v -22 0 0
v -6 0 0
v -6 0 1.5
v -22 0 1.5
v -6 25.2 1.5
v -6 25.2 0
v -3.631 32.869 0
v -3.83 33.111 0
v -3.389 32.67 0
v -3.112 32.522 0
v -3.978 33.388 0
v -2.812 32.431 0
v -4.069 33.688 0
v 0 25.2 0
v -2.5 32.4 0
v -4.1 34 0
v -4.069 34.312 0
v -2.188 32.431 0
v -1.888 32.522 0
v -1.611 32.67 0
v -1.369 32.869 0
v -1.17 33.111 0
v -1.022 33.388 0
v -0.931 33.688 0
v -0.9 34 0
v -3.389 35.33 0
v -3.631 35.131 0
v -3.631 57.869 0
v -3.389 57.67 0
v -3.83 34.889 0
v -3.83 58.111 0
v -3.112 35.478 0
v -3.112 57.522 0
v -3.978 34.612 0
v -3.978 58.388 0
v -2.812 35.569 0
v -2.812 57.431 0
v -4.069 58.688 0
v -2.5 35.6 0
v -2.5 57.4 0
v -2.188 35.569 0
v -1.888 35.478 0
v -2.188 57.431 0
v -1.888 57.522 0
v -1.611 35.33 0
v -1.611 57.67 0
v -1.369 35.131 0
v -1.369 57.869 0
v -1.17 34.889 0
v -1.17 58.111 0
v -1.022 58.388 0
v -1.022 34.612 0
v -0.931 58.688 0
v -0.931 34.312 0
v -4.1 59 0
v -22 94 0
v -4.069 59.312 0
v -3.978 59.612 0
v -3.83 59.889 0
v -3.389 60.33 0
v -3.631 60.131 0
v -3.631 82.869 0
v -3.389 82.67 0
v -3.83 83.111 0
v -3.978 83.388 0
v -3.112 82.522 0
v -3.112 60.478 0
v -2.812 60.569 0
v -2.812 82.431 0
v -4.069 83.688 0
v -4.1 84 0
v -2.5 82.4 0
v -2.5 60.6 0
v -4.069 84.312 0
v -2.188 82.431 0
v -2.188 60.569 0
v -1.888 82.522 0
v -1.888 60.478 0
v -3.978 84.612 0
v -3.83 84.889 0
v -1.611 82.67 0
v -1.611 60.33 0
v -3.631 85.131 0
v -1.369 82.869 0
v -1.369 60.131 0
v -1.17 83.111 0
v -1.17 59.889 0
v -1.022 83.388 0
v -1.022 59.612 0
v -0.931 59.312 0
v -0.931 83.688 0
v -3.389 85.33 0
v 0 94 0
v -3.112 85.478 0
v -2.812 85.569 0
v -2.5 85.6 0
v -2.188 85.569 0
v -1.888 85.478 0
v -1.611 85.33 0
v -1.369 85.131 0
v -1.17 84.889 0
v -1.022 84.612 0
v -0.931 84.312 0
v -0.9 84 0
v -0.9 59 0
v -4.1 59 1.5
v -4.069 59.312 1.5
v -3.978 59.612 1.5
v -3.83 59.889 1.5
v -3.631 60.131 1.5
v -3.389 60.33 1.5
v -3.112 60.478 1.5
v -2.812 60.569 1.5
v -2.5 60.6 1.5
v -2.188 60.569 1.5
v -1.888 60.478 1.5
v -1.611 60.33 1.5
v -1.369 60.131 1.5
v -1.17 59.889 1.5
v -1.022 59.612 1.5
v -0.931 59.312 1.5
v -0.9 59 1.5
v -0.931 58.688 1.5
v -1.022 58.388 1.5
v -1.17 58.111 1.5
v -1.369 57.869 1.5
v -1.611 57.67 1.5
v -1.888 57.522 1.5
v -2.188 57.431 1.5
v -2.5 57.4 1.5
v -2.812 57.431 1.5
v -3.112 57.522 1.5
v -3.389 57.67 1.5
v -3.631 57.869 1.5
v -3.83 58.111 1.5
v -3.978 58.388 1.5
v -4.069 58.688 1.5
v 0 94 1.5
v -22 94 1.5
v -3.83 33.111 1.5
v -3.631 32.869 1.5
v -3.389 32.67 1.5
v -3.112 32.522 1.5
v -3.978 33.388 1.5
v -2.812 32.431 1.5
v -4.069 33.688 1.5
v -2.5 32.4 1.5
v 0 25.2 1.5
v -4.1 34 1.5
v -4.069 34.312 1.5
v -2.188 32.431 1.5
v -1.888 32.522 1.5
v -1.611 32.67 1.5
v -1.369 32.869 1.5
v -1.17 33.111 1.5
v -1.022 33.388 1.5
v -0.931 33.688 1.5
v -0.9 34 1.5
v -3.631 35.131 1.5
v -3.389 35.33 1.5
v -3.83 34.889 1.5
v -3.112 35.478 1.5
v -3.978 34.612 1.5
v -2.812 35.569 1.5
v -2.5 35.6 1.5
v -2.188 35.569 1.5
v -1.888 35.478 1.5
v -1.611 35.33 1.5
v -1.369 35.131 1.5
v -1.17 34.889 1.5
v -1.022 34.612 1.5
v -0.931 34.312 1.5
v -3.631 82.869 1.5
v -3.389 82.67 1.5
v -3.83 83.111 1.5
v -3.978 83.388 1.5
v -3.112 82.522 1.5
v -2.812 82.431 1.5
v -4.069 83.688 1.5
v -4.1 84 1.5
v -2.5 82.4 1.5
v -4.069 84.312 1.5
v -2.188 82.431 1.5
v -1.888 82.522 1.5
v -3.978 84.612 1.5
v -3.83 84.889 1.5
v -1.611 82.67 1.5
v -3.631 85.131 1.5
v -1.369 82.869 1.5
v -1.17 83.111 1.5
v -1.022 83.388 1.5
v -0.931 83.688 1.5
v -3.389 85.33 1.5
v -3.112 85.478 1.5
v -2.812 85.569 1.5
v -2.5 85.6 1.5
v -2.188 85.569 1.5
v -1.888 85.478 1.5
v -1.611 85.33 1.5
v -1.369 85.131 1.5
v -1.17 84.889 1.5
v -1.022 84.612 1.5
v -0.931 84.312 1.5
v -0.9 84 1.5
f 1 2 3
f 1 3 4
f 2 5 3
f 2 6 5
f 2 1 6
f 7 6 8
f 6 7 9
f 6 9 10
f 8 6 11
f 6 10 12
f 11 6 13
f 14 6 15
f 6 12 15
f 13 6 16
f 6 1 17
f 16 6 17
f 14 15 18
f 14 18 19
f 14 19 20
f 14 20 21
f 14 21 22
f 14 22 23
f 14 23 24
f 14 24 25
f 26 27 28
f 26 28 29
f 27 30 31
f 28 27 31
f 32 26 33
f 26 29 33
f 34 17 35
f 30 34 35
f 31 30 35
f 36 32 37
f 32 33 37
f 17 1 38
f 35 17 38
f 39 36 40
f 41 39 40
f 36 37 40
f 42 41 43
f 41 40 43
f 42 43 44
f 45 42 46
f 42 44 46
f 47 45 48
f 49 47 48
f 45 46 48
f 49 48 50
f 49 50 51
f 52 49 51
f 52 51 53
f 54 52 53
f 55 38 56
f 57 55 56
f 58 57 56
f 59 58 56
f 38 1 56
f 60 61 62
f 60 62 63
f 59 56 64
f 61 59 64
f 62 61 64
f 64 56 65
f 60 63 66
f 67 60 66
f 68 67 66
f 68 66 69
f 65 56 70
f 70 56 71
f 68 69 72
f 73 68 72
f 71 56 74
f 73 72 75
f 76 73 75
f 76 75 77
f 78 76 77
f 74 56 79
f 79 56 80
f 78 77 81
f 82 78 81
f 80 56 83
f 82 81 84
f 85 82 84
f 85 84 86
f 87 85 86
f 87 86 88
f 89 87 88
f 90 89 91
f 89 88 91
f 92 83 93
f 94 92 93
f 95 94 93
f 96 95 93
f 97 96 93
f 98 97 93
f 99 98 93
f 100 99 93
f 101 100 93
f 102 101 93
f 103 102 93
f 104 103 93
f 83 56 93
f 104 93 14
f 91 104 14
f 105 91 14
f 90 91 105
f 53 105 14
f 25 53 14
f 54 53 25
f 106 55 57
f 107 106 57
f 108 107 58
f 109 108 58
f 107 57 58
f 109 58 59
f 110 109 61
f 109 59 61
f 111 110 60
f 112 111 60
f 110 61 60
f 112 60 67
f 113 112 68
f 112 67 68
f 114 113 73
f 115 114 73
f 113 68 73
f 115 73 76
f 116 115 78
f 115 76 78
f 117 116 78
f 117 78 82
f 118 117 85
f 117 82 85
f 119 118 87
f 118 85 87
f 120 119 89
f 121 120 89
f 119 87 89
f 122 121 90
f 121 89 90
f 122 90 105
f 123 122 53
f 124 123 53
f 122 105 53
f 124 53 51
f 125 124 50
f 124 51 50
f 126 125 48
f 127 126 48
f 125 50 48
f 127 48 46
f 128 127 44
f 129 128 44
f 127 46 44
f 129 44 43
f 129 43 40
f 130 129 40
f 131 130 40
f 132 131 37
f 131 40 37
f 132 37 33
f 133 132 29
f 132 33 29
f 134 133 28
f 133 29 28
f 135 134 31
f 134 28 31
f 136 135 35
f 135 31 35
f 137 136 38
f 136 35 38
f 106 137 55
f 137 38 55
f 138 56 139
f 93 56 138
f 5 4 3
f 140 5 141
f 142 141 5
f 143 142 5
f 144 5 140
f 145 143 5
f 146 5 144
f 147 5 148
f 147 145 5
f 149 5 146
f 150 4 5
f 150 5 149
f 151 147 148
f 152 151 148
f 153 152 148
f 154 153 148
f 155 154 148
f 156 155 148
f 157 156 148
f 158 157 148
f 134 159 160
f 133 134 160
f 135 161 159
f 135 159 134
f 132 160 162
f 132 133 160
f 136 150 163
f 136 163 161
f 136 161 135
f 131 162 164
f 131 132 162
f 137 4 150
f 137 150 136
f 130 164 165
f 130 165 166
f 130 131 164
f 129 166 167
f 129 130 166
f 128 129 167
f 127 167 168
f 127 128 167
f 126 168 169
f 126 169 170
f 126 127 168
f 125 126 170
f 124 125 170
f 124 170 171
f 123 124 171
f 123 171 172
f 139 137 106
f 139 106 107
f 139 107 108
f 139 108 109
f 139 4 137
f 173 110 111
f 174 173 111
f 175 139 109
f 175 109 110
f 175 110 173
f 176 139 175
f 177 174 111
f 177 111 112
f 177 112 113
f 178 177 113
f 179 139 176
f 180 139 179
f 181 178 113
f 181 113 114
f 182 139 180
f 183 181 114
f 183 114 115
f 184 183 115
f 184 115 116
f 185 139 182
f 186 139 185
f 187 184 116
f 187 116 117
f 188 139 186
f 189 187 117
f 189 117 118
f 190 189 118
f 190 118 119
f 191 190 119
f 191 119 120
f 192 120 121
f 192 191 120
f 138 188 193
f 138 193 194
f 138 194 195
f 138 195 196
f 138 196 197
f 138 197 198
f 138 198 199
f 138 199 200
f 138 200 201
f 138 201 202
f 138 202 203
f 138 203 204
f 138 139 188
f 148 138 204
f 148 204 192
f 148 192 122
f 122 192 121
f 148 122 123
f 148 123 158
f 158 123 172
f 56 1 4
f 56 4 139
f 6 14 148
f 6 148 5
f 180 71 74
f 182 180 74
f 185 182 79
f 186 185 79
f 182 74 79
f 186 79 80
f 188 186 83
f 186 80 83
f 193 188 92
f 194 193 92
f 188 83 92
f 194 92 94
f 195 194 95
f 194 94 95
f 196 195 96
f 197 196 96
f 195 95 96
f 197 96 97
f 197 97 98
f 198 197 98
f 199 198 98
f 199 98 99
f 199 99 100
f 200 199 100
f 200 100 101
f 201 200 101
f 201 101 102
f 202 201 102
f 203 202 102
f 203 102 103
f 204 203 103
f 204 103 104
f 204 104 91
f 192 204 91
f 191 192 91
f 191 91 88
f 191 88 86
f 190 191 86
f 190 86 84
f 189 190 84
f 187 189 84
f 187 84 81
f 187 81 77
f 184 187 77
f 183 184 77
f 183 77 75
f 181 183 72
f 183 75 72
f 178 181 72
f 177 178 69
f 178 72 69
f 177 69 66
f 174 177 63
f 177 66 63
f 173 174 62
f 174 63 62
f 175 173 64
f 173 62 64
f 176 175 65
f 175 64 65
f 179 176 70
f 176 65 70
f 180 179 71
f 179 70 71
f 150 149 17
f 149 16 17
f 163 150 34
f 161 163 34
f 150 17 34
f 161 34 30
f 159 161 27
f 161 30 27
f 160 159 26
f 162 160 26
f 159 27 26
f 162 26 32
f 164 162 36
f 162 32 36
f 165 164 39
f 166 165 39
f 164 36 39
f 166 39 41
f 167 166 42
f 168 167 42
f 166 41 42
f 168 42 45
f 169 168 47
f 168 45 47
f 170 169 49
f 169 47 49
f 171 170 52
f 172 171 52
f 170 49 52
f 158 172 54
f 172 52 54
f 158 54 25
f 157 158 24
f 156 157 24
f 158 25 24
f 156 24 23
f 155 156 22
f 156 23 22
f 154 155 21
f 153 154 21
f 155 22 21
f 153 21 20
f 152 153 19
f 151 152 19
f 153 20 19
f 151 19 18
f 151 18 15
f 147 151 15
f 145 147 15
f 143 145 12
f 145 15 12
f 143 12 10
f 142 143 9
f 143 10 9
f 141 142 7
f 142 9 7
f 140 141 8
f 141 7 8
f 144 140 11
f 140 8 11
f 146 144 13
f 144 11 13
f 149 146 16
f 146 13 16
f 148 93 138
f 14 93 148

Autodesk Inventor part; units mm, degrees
ref_plane "YZ Plane" through (0, 0, 0) normal (1, 0, 0) x (0, 1, 0)
ref_plane "XZ Plane" through (0, 0, 0) normal (0, 1, 0) x (-1, 0, 0)
ref_plane "XY Plane" through (0, 0, 0) normal (0, 0, 1) x (1, 0, 0)
sketch "スケッチ1" plane through (0, 0, 0) normal (0, 0, 1) x (1, 0, 0)
  line L0 (0, 0) -> (-22, 0)
  line L1 (-22, 0) -> (-22, 94)
  line L2 (-22, 94) -> (0, 94)
  line L3 (0, 94) -> (0, 0)
  dimension "d0" = 22
  dimension "d1" = 94
extrude "押し出し1" add sketch "スケッチ1" along normal blind 1.5
sketch "スケッチ2" plane through (0, 0, 0) normal (0, 0, -1) x (-1, 0, 0)
  line L0 (5, 24.2) -> (5, 94) projected
  circle A0 centre (2.5, 84) radius 1.6
  line L1 (0, 94) -> (22, 94) projected
  line L2 (5, 94) -> (0, 94)
  circle A1 centre (2.5, 59) radius 1.6
  circle A2 centre (2.5, 34) radius 1.6
  circle A3 centre (2.5, 9) radius 1.6
  point P0 (0, 0)
  point P1 (2.5, 94)
  dimension "d4" = 3.2
  dimension "d5" = 10
  dimension "d8" = 25
extrude "押し出し2" cut sketch "スケッチ2" against normal through all
sketch "スケッチ3" plane through (0, 0, 0) normal (0, 0, -1) x (-1, 0, 0)
  line L0 (3.2909, 24.2) -> (5, 24.2) projected
  line L1 (0, 0) -> (0, 94) projected
  line L2 (0, 25.2) -> (6, 25.2)
  line L3 (6, 25.2) -> (6, 0)
  line L4 (6, 0) -> (0, 0)
  line L5 (0, 0) -> (0, 25.2)
  line L6 (5, 14.2) -> (5, 24.2) projected
  line L7 (22, 0) -> (0, 0) projected
  dimension "d15" = 1
  dimension "d16" = 1
extrude "押し出し3" cut sketch "スケッチ3" against normal through all
properties part number "rail_backcover"
